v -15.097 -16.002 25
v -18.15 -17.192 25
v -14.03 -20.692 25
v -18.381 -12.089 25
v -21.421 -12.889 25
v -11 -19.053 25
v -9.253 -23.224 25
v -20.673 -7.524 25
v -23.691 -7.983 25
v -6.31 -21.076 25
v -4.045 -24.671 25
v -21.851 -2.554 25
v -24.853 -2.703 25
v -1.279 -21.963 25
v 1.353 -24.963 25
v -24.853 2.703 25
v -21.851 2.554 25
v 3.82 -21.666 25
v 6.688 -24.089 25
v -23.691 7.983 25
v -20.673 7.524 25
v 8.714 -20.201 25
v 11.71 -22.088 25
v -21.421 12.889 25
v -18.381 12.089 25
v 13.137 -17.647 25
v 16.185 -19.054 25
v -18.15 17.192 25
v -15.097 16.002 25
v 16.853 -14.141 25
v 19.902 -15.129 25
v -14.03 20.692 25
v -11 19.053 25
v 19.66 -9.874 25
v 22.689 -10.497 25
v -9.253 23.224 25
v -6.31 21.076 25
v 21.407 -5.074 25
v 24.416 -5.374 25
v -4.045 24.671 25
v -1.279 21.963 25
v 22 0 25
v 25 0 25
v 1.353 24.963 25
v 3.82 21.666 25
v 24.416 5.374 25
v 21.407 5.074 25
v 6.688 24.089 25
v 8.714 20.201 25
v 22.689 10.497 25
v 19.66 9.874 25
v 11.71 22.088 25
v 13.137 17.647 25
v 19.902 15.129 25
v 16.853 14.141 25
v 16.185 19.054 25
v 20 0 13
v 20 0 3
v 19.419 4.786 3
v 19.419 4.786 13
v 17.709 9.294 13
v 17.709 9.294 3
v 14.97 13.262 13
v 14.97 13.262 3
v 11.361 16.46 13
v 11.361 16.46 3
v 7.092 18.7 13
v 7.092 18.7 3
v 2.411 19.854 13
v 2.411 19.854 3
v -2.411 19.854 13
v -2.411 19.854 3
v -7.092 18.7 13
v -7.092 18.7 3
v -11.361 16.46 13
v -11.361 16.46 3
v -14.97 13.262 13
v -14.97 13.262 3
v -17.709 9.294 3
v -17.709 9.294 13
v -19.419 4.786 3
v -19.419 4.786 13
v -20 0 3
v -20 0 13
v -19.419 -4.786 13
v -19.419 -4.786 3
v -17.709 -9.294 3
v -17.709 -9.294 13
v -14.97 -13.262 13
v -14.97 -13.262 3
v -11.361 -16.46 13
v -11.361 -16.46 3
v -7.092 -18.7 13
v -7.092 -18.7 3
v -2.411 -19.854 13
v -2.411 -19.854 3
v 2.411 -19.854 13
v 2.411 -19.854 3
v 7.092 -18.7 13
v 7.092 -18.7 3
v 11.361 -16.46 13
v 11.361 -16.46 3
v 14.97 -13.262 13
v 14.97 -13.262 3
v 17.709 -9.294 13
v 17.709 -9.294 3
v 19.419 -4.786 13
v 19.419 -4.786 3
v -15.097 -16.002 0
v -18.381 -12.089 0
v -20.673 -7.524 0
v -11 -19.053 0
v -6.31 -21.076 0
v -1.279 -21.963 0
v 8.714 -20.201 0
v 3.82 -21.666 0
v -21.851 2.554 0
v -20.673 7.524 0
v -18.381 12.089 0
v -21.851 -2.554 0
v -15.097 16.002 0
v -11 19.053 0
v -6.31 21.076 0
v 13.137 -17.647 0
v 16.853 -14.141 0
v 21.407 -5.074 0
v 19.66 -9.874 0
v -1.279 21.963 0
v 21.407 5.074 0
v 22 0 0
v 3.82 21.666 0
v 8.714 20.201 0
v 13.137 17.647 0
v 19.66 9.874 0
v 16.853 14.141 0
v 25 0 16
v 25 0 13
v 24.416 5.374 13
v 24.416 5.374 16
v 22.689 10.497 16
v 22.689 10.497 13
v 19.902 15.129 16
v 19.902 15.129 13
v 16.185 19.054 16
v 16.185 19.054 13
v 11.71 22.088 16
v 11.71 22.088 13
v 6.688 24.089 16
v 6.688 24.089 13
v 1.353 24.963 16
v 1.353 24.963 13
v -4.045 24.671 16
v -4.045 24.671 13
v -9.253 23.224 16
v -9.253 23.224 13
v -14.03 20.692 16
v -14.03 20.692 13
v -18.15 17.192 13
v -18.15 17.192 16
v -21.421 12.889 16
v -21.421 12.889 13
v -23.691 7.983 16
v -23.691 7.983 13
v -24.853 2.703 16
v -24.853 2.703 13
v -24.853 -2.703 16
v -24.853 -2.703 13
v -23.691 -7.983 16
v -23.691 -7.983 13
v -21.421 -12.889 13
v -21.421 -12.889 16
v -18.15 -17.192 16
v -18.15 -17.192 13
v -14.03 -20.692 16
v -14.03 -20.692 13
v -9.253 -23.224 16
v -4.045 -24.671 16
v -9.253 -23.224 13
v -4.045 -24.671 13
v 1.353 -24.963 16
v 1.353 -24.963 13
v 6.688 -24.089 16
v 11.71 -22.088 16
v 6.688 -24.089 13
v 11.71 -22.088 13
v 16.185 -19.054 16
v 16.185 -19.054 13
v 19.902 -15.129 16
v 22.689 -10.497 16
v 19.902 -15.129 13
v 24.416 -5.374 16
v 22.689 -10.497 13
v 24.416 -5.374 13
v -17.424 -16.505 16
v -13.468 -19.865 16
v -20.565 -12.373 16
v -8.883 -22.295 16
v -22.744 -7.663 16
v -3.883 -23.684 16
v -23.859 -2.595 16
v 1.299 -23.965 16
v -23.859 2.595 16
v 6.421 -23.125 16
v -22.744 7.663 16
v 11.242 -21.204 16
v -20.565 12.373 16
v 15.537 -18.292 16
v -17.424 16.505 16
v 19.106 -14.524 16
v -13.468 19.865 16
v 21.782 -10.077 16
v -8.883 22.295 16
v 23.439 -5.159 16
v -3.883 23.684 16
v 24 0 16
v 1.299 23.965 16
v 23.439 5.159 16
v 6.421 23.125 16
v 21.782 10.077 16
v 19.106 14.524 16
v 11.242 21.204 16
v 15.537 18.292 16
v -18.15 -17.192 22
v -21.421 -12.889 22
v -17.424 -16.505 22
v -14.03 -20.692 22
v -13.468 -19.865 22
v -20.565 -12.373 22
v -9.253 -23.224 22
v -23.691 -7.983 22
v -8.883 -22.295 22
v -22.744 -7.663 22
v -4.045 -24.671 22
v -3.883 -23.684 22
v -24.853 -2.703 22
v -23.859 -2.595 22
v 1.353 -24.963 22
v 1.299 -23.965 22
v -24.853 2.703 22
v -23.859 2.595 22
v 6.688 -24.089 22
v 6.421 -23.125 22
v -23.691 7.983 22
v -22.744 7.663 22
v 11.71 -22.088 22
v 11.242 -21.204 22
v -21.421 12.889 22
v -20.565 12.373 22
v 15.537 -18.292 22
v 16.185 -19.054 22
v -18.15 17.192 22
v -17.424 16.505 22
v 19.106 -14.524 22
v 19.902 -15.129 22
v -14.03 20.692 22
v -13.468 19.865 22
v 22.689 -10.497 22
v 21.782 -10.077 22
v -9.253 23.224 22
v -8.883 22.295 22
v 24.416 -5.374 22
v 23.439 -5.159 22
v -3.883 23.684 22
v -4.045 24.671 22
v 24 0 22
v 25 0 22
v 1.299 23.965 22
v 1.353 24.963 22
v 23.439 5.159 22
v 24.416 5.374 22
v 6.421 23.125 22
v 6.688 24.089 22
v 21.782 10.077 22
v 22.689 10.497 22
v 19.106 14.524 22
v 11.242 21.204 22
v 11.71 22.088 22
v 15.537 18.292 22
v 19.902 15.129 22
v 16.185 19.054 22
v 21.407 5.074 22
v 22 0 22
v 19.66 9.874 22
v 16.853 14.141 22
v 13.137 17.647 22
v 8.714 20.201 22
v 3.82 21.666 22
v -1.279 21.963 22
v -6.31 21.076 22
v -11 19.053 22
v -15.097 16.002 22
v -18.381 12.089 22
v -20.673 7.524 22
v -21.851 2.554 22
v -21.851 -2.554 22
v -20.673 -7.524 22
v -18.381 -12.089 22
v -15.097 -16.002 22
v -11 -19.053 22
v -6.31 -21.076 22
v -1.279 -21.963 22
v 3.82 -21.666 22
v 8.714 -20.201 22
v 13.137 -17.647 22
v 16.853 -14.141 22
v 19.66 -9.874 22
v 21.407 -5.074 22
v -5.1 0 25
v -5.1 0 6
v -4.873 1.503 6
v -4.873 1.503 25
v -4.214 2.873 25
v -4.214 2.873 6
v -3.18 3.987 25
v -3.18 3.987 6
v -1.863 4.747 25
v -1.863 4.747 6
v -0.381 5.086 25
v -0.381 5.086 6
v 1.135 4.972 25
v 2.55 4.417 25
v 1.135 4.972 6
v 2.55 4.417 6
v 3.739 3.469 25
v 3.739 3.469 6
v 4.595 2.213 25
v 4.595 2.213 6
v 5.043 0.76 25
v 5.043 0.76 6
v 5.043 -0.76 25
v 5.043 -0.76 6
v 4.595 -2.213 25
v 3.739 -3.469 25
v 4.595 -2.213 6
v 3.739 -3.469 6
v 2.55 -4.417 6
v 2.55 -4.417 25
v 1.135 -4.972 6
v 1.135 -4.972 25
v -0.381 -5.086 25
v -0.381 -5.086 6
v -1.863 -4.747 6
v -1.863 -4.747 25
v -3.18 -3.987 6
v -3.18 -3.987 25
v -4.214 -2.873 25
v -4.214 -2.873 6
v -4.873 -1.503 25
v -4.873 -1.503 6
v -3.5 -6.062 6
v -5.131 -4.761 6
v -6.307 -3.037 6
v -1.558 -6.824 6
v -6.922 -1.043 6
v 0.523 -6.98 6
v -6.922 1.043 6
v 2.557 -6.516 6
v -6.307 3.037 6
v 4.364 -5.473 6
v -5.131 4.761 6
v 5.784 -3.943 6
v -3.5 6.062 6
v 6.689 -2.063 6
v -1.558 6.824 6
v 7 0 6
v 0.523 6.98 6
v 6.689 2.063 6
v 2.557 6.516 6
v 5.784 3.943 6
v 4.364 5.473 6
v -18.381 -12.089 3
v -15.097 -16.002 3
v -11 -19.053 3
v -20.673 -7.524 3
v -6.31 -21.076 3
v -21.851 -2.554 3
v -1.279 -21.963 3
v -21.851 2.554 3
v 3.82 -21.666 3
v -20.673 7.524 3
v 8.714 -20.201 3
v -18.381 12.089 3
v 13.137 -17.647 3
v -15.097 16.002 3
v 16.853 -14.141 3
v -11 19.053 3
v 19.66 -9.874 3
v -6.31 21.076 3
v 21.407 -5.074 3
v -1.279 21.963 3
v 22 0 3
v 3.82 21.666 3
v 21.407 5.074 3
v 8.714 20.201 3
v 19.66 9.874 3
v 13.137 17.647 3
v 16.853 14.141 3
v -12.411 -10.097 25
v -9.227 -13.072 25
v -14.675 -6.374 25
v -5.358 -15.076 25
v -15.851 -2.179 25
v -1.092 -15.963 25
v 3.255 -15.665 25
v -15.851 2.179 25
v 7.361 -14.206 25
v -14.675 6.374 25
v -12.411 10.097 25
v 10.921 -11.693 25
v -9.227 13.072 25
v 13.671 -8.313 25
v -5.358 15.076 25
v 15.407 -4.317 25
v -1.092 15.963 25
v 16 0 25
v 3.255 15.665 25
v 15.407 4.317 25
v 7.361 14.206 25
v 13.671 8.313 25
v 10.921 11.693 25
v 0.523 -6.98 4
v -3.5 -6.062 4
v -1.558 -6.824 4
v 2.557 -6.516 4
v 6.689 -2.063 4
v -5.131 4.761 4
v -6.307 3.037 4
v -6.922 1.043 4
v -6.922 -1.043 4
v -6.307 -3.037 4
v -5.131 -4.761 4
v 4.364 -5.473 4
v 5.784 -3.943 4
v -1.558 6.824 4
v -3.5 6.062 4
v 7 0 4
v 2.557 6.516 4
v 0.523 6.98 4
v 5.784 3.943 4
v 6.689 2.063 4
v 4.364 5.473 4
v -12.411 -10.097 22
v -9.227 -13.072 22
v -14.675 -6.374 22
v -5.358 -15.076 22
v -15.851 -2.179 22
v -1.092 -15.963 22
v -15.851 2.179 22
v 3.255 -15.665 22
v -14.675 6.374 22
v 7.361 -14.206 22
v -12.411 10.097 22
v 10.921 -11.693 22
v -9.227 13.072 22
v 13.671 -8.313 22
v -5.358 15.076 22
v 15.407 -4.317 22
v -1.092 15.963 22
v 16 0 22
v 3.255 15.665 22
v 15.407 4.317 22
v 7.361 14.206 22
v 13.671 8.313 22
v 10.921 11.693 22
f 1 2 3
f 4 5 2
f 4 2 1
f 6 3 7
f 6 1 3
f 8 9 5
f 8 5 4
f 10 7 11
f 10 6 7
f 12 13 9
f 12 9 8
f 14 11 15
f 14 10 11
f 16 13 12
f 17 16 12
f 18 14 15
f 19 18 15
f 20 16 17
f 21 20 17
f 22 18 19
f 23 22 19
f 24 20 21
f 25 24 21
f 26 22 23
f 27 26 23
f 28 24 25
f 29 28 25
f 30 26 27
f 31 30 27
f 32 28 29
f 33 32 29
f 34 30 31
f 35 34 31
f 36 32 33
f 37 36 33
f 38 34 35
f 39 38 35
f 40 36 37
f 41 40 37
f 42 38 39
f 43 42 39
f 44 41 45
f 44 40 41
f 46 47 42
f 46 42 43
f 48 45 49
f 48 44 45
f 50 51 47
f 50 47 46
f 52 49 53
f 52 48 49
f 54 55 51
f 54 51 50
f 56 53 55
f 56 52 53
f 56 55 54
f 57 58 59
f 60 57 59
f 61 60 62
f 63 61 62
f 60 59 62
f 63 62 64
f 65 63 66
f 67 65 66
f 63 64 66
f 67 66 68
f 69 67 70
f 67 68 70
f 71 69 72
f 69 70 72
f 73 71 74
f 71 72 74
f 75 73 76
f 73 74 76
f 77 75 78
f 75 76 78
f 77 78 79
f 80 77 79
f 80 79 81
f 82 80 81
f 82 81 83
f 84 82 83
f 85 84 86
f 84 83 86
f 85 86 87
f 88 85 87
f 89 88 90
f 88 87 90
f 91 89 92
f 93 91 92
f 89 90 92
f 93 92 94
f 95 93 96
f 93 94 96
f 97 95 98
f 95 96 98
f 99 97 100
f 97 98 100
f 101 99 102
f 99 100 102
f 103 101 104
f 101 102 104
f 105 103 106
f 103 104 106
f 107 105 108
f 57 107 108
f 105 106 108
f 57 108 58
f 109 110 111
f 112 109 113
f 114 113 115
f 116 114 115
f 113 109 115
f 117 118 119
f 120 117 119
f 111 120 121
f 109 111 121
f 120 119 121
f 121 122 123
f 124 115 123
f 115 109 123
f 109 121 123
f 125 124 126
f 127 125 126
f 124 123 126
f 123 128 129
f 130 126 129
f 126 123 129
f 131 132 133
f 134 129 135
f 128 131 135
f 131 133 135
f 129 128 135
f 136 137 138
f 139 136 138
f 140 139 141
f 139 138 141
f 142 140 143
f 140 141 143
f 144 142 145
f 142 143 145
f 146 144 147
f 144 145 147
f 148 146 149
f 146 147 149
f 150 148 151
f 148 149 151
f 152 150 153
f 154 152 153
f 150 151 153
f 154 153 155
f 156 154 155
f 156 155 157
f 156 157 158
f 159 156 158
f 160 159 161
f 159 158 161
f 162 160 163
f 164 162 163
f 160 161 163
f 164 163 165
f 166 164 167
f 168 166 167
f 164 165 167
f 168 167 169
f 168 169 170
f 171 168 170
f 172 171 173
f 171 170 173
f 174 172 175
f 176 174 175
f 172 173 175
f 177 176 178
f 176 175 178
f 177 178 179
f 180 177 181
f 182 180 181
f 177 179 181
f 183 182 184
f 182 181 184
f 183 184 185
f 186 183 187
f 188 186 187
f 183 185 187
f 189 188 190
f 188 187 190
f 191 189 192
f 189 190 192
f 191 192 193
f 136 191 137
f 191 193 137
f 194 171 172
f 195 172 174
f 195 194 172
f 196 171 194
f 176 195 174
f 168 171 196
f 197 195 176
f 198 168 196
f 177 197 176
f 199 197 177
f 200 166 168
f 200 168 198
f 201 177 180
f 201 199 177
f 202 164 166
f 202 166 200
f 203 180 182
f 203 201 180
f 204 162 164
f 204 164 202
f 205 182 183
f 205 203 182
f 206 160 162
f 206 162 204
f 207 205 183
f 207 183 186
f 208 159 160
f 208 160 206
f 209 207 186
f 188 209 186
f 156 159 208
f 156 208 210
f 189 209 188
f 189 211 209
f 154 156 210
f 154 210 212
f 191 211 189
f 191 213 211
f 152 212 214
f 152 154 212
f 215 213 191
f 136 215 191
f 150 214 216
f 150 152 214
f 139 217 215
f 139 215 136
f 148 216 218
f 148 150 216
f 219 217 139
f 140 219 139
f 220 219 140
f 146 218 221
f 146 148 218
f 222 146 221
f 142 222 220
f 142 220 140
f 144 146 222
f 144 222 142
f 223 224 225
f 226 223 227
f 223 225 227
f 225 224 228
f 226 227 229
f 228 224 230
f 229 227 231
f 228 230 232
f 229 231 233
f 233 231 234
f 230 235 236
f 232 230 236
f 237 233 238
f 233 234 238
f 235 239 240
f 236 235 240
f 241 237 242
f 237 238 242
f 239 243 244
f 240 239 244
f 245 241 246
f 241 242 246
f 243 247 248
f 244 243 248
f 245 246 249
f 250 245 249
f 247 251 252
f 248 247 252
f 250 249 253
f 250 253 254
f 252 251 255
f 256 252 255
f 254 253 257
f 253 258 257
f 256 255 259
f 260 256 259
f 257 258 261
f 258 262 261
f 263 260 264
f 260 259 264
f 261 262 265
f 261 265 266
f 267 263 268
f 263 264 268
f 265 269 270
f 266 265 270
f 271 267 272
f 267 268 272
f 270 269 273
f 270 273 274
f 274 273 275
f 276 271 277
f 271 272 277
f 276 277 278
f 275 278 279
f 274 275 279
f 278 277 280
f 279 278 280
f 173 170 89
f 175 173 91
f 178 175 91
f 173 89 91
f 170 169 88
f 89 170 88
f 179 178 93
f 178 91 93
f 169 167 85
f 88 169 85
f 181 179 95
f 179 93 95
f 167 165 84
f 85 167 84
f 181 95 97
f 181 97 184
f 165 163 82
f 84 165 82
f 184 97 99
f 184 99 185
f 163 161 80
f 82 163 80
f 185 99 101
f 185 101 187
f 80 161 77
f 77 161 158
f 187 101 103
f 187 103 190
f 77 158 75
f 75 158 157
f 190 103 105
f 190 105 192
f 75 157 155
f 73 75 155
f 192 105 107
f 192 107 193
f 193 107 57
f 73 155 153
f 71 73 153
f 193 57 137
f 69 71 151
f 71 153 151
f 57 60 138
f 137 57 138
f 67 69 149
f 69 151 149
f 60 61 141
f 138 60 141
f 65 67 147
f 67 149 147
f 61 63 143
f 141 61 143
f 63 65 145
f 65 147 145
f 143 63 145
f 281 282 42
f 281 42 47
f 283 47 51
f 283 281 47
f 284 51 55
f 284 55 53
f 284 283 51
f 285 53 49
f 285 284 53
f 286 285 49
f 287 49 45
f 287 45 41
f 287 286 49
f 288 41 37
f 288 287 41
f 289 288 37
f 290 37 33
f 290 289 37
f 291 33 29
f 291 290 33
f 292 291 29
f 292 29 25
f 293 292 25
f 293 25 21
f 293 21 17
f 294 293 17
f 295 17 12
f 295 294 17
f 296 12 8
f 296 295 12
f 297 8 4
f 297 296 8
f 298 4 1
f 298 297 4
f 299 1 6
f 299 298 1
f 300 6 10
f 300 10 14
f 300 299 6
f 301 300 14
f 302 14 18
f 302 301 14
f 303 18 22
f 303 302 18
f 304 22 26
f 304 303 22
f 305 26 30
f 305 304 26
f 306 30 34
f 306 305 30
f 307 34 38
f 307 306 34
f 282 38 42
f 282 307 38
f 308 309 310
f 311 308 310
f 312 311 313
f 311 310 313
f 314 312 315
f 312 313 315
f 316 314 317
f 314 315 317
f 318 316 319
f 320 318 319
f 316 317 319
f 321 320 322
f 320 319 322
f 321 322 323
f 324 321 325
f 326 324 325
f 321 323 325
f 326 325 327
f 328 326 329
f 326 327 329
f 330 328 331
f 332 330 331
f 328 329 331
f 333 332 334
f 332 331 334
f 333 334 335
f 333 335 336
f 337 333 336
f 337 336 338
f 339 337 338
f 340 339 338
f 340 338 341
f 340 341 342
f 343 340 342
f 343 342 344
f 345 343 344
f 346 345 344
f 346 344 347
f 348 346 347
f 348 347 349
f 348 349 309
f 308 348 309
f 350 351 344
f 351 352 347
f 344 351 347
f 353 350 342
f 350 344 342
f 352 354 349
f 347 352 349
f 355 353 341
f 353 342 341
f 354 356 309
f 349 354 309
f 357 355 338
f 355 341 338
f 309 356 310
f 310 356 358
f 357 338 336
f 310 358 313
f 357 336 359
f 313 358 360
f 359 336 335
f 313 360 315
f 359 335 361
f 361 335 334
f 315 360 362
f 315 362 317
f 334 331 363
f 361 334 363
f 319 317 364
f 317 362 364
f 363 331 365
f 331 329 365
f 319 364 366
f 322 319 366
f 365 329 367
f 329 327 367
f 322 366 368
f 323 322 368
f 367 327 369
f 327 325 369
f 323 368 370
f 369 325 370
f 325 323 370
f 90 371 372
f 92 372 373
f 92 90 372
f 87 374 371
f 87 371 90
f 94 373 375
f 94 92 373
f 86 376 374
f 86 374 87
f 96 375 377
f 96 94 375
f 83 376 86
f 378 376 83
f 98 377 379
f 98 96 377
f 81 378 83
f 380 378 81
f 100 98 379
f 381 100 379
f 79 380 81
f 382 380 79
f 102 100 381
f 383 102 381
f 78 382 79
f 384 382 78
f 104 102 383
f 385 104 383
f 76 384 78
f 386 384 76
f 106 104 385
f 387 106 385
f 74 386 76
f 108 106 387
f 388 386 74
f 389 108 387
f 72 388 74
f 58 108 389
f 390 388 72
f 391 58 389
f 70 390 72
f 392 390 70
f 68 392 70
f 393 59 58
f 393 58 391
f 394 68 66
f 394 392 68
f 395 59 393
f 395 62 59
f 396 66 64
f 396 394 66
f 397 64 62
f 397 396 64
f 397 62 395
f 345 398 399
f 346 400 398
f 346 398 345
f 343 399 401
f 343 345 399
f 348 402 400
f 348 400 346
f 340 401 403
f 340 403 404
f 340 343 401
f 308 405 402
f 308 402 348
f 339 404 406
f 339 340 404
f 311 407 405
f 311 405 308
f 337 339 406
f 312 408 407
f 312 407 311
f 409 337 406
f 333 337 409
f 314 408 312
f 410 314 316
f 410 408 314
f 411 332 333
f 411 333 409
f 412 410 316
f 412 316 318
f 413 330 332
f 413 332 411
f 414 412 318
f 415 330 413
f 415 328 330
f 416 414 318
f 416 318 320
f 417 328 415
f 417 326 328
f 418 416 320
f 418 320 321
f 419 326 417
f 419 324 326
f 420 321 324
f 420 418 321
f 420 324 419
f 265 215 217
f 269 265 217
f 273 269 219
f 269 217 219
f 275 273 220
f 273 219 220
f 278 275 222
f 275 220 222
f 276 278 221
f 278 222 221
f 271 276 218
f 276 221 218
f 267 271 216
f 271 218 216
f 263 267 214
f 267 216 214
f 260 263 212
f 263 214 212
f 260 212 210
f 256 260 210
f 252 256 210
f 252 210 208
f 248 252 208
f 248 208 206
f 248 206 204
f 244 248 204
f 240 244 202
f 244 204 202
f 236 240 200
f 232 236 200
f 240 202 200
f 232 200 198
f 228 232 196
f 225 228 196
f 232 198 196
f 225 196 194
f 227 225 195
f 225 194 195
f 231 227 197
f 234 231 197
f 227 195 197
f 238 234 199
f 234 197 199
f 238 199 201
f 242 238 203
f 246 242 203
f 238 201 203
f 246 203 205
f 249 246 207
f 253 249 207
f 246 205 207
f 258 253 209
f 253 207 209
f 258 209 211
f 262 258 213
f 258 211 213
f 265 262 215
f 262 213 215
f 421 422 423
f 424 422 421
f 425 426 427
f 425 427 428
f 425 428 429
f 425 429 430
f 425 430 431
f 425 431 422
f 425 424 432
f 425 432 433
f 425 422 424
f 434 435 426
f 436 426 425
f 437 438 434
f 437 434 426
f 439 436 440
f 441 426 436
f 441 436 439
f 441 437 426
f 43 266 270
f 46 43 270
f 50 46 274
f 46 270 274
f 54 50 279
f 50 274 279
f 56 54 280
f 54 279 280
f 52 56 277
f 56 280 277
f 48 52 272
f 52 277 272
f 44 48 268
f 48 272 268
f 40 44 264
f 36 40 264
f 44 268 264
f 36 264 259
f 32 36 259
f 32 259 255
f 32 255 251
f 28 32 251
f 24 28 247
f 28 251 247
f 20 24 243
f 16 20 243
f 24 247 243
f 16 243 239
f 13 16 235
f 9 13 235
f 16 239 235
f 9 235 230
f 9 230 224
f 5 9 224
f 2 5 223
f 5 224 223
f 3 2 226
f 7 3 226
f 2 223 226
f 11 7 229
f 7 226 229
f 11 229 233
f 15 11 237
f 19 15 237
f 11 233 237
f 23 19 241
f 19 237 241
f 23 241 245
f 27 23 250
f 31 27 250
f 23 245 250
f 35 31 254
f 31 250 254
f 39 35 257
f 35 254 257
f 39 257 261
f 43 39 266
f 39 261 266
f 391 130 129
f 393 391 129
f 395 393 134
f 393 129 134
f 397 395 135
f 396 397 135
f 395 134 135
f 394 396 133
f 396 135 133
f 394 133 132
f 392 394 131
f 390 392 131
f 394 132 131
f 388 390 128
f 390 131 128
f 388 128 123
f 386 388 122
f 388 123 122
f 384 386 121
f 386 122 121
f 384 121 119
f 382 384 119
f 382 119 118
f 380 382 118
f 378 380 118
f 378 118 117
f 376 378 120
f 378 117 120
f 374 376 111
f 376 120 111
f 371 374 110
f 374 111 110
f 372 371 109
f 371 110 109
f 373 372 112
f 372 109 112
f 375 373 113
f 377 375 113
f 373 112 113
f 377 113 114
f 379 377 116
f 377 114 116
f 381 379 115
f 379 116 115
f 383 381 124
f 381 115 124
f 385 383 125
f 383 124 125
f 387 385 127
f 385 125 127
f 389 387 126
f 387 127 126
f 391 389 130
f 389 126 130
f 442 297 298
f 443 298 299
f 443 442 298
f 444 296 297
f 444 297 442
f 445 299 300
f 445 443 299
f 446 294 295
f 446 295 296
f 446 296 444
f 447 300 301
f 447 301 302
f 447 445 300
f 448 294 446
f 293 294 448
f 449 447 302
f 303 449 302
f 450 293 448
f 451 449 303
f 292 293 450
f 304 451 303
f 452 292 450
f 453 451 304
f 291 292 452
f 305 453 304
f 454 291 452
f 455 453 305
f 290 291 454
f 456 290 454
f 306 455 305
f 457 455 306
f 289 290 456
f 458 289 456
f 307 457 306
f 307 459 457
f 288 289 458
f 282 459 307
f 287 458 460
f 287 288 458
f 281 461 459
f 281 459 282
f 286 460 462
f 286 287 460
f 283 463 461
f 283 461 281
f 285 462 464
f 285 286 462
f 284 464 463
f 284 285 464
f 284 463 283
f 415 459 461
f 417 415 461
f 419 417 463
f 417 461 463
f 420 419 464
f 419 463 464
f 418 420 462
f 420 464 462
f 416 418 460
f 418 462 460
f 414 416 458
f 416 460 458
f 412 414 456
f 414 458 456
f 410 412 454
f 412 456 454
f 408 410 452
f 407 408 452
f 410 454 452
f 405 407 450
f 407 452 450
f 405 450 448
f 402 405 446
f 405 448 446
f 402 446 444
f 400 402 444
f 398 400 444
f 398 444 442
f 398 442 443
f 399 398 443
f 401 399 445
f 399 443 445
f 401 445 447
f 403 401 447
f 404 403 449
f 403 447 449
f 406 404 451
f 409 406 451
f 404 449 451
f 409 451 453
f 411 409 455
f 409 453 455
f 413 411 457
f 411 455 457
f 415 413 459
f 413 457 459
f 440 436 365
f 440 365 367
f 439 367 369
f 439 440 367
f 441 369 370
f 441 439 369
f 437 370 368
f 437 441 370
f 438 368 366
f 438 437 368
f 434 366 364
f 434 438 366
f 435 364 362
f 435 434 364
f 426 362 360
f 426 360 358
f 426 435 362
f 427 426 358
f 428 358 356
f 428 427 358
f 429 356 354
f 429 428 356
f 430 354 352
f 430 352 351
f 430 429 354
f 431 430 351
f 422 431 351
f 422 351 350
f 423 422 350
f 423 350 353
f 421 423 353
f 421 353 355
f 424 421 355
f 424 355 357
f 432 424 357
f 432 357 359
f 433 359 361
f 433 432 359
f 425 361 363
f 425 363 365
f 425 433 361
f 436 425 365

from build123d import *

# Parameters (mm, degrees)
SKETCH1_R              = 22
BOSS_EXTRUDE1_DEPTH    = 3
SKETCH2_R              = 20
BOSS_EXTRUDE2_DEPTH    = 10
SKETCH3_R              = 25
BOSS_EXTRUDE3_DEPTH    = 3
SKETCH4_R              = 24
BOSS_EXTRUDE4_DEPTH    = 6
SKETCH5_R              = 25
BOSS_EXTRUDE5_DEPTH    = 3
CUT_EXTRUDE1_START     = -3
SKETCH6_R              = 22
SKETCH6_R_2            = 16
CUT_EXTRUDE1_DEPTH     = 3
SKETCH8_R              = 7
CUT_EXTRUDE2_DEPTH     = 2
M12_TAPPED_HOLE1_D     = 10.2
M12_TAPPED_HOLE1_DEPTH = 19


with BuildPart() as part:
    # Sketch1 → Boss-Extrude1 (new body)
    with BuildSketch(Plane.XY):
        Circle(SKETCH1_R)
    extrude(amount=BOSS_EXTRUDE1_DEPTH)

    # Sketch2 → Boss-Extrude2 (add)
    with BuildSketch(Plane.XY.offset(3)):
        Circle(SKETCH2_R)
    extrude(amount=BOSS_EXTRUDE2_DEPTH)

    # Sketch3 → Boss-Extrude3 (add)
    with BuildSketch(Plane.XY.offset(13)):
        Circle(SKETCH3_R)
    extrude(amount=BOSS_EXTRUDE3_DEPTH)

    # Sketch4 → Boss-Extrude4 (add)
    with BuildSketch(Plane.XY.offset(16)):
        Circle(SKETCH4_R)
    extrude(amount=BOSS_EXTRUDE4_DEPTH)

    # Sketch5 → Boss-Extrude5 (add)
    with BuildSketch(Plane.XY.offset(22)):
        Circle(SKETCH5_R)
    extrude(amount=BOSS_EXTRUDE5_DEPTH)

    # Sketch6 → Cut-Extrude1 (cut)
    with BuildSketch(Plane.XY.offset(25).offset(CUT_EXTRUDE1_START)):
        Circle(SKETCH6_R)
        Circle(SKETCH6_R_2, mode=Mode.SUBTRACT)
    extrude(amount=CUT_EXTRUDE1_DEPTH, mode=Mode.SUBTRACT)

    # Sketch8 → Cut-Extrude2 (cut)
    with BuildSketch(Plane.XY.offset(4)):
        Circle(SKETCH8_R)
    extrude(amount=CUT_EXTRUDE2_DEPTH, mode=Mode.SUBTRACT)

    # M12 Tapped Hole1
    with Locations(Plane.XY.offset(25)):
        with Locations((0, 0)):
            Hole(M12_TAPPED_HOLE1_D / 2, depth=M12_TAPPED_HOLE1_DEPTH)


solid = part.part
